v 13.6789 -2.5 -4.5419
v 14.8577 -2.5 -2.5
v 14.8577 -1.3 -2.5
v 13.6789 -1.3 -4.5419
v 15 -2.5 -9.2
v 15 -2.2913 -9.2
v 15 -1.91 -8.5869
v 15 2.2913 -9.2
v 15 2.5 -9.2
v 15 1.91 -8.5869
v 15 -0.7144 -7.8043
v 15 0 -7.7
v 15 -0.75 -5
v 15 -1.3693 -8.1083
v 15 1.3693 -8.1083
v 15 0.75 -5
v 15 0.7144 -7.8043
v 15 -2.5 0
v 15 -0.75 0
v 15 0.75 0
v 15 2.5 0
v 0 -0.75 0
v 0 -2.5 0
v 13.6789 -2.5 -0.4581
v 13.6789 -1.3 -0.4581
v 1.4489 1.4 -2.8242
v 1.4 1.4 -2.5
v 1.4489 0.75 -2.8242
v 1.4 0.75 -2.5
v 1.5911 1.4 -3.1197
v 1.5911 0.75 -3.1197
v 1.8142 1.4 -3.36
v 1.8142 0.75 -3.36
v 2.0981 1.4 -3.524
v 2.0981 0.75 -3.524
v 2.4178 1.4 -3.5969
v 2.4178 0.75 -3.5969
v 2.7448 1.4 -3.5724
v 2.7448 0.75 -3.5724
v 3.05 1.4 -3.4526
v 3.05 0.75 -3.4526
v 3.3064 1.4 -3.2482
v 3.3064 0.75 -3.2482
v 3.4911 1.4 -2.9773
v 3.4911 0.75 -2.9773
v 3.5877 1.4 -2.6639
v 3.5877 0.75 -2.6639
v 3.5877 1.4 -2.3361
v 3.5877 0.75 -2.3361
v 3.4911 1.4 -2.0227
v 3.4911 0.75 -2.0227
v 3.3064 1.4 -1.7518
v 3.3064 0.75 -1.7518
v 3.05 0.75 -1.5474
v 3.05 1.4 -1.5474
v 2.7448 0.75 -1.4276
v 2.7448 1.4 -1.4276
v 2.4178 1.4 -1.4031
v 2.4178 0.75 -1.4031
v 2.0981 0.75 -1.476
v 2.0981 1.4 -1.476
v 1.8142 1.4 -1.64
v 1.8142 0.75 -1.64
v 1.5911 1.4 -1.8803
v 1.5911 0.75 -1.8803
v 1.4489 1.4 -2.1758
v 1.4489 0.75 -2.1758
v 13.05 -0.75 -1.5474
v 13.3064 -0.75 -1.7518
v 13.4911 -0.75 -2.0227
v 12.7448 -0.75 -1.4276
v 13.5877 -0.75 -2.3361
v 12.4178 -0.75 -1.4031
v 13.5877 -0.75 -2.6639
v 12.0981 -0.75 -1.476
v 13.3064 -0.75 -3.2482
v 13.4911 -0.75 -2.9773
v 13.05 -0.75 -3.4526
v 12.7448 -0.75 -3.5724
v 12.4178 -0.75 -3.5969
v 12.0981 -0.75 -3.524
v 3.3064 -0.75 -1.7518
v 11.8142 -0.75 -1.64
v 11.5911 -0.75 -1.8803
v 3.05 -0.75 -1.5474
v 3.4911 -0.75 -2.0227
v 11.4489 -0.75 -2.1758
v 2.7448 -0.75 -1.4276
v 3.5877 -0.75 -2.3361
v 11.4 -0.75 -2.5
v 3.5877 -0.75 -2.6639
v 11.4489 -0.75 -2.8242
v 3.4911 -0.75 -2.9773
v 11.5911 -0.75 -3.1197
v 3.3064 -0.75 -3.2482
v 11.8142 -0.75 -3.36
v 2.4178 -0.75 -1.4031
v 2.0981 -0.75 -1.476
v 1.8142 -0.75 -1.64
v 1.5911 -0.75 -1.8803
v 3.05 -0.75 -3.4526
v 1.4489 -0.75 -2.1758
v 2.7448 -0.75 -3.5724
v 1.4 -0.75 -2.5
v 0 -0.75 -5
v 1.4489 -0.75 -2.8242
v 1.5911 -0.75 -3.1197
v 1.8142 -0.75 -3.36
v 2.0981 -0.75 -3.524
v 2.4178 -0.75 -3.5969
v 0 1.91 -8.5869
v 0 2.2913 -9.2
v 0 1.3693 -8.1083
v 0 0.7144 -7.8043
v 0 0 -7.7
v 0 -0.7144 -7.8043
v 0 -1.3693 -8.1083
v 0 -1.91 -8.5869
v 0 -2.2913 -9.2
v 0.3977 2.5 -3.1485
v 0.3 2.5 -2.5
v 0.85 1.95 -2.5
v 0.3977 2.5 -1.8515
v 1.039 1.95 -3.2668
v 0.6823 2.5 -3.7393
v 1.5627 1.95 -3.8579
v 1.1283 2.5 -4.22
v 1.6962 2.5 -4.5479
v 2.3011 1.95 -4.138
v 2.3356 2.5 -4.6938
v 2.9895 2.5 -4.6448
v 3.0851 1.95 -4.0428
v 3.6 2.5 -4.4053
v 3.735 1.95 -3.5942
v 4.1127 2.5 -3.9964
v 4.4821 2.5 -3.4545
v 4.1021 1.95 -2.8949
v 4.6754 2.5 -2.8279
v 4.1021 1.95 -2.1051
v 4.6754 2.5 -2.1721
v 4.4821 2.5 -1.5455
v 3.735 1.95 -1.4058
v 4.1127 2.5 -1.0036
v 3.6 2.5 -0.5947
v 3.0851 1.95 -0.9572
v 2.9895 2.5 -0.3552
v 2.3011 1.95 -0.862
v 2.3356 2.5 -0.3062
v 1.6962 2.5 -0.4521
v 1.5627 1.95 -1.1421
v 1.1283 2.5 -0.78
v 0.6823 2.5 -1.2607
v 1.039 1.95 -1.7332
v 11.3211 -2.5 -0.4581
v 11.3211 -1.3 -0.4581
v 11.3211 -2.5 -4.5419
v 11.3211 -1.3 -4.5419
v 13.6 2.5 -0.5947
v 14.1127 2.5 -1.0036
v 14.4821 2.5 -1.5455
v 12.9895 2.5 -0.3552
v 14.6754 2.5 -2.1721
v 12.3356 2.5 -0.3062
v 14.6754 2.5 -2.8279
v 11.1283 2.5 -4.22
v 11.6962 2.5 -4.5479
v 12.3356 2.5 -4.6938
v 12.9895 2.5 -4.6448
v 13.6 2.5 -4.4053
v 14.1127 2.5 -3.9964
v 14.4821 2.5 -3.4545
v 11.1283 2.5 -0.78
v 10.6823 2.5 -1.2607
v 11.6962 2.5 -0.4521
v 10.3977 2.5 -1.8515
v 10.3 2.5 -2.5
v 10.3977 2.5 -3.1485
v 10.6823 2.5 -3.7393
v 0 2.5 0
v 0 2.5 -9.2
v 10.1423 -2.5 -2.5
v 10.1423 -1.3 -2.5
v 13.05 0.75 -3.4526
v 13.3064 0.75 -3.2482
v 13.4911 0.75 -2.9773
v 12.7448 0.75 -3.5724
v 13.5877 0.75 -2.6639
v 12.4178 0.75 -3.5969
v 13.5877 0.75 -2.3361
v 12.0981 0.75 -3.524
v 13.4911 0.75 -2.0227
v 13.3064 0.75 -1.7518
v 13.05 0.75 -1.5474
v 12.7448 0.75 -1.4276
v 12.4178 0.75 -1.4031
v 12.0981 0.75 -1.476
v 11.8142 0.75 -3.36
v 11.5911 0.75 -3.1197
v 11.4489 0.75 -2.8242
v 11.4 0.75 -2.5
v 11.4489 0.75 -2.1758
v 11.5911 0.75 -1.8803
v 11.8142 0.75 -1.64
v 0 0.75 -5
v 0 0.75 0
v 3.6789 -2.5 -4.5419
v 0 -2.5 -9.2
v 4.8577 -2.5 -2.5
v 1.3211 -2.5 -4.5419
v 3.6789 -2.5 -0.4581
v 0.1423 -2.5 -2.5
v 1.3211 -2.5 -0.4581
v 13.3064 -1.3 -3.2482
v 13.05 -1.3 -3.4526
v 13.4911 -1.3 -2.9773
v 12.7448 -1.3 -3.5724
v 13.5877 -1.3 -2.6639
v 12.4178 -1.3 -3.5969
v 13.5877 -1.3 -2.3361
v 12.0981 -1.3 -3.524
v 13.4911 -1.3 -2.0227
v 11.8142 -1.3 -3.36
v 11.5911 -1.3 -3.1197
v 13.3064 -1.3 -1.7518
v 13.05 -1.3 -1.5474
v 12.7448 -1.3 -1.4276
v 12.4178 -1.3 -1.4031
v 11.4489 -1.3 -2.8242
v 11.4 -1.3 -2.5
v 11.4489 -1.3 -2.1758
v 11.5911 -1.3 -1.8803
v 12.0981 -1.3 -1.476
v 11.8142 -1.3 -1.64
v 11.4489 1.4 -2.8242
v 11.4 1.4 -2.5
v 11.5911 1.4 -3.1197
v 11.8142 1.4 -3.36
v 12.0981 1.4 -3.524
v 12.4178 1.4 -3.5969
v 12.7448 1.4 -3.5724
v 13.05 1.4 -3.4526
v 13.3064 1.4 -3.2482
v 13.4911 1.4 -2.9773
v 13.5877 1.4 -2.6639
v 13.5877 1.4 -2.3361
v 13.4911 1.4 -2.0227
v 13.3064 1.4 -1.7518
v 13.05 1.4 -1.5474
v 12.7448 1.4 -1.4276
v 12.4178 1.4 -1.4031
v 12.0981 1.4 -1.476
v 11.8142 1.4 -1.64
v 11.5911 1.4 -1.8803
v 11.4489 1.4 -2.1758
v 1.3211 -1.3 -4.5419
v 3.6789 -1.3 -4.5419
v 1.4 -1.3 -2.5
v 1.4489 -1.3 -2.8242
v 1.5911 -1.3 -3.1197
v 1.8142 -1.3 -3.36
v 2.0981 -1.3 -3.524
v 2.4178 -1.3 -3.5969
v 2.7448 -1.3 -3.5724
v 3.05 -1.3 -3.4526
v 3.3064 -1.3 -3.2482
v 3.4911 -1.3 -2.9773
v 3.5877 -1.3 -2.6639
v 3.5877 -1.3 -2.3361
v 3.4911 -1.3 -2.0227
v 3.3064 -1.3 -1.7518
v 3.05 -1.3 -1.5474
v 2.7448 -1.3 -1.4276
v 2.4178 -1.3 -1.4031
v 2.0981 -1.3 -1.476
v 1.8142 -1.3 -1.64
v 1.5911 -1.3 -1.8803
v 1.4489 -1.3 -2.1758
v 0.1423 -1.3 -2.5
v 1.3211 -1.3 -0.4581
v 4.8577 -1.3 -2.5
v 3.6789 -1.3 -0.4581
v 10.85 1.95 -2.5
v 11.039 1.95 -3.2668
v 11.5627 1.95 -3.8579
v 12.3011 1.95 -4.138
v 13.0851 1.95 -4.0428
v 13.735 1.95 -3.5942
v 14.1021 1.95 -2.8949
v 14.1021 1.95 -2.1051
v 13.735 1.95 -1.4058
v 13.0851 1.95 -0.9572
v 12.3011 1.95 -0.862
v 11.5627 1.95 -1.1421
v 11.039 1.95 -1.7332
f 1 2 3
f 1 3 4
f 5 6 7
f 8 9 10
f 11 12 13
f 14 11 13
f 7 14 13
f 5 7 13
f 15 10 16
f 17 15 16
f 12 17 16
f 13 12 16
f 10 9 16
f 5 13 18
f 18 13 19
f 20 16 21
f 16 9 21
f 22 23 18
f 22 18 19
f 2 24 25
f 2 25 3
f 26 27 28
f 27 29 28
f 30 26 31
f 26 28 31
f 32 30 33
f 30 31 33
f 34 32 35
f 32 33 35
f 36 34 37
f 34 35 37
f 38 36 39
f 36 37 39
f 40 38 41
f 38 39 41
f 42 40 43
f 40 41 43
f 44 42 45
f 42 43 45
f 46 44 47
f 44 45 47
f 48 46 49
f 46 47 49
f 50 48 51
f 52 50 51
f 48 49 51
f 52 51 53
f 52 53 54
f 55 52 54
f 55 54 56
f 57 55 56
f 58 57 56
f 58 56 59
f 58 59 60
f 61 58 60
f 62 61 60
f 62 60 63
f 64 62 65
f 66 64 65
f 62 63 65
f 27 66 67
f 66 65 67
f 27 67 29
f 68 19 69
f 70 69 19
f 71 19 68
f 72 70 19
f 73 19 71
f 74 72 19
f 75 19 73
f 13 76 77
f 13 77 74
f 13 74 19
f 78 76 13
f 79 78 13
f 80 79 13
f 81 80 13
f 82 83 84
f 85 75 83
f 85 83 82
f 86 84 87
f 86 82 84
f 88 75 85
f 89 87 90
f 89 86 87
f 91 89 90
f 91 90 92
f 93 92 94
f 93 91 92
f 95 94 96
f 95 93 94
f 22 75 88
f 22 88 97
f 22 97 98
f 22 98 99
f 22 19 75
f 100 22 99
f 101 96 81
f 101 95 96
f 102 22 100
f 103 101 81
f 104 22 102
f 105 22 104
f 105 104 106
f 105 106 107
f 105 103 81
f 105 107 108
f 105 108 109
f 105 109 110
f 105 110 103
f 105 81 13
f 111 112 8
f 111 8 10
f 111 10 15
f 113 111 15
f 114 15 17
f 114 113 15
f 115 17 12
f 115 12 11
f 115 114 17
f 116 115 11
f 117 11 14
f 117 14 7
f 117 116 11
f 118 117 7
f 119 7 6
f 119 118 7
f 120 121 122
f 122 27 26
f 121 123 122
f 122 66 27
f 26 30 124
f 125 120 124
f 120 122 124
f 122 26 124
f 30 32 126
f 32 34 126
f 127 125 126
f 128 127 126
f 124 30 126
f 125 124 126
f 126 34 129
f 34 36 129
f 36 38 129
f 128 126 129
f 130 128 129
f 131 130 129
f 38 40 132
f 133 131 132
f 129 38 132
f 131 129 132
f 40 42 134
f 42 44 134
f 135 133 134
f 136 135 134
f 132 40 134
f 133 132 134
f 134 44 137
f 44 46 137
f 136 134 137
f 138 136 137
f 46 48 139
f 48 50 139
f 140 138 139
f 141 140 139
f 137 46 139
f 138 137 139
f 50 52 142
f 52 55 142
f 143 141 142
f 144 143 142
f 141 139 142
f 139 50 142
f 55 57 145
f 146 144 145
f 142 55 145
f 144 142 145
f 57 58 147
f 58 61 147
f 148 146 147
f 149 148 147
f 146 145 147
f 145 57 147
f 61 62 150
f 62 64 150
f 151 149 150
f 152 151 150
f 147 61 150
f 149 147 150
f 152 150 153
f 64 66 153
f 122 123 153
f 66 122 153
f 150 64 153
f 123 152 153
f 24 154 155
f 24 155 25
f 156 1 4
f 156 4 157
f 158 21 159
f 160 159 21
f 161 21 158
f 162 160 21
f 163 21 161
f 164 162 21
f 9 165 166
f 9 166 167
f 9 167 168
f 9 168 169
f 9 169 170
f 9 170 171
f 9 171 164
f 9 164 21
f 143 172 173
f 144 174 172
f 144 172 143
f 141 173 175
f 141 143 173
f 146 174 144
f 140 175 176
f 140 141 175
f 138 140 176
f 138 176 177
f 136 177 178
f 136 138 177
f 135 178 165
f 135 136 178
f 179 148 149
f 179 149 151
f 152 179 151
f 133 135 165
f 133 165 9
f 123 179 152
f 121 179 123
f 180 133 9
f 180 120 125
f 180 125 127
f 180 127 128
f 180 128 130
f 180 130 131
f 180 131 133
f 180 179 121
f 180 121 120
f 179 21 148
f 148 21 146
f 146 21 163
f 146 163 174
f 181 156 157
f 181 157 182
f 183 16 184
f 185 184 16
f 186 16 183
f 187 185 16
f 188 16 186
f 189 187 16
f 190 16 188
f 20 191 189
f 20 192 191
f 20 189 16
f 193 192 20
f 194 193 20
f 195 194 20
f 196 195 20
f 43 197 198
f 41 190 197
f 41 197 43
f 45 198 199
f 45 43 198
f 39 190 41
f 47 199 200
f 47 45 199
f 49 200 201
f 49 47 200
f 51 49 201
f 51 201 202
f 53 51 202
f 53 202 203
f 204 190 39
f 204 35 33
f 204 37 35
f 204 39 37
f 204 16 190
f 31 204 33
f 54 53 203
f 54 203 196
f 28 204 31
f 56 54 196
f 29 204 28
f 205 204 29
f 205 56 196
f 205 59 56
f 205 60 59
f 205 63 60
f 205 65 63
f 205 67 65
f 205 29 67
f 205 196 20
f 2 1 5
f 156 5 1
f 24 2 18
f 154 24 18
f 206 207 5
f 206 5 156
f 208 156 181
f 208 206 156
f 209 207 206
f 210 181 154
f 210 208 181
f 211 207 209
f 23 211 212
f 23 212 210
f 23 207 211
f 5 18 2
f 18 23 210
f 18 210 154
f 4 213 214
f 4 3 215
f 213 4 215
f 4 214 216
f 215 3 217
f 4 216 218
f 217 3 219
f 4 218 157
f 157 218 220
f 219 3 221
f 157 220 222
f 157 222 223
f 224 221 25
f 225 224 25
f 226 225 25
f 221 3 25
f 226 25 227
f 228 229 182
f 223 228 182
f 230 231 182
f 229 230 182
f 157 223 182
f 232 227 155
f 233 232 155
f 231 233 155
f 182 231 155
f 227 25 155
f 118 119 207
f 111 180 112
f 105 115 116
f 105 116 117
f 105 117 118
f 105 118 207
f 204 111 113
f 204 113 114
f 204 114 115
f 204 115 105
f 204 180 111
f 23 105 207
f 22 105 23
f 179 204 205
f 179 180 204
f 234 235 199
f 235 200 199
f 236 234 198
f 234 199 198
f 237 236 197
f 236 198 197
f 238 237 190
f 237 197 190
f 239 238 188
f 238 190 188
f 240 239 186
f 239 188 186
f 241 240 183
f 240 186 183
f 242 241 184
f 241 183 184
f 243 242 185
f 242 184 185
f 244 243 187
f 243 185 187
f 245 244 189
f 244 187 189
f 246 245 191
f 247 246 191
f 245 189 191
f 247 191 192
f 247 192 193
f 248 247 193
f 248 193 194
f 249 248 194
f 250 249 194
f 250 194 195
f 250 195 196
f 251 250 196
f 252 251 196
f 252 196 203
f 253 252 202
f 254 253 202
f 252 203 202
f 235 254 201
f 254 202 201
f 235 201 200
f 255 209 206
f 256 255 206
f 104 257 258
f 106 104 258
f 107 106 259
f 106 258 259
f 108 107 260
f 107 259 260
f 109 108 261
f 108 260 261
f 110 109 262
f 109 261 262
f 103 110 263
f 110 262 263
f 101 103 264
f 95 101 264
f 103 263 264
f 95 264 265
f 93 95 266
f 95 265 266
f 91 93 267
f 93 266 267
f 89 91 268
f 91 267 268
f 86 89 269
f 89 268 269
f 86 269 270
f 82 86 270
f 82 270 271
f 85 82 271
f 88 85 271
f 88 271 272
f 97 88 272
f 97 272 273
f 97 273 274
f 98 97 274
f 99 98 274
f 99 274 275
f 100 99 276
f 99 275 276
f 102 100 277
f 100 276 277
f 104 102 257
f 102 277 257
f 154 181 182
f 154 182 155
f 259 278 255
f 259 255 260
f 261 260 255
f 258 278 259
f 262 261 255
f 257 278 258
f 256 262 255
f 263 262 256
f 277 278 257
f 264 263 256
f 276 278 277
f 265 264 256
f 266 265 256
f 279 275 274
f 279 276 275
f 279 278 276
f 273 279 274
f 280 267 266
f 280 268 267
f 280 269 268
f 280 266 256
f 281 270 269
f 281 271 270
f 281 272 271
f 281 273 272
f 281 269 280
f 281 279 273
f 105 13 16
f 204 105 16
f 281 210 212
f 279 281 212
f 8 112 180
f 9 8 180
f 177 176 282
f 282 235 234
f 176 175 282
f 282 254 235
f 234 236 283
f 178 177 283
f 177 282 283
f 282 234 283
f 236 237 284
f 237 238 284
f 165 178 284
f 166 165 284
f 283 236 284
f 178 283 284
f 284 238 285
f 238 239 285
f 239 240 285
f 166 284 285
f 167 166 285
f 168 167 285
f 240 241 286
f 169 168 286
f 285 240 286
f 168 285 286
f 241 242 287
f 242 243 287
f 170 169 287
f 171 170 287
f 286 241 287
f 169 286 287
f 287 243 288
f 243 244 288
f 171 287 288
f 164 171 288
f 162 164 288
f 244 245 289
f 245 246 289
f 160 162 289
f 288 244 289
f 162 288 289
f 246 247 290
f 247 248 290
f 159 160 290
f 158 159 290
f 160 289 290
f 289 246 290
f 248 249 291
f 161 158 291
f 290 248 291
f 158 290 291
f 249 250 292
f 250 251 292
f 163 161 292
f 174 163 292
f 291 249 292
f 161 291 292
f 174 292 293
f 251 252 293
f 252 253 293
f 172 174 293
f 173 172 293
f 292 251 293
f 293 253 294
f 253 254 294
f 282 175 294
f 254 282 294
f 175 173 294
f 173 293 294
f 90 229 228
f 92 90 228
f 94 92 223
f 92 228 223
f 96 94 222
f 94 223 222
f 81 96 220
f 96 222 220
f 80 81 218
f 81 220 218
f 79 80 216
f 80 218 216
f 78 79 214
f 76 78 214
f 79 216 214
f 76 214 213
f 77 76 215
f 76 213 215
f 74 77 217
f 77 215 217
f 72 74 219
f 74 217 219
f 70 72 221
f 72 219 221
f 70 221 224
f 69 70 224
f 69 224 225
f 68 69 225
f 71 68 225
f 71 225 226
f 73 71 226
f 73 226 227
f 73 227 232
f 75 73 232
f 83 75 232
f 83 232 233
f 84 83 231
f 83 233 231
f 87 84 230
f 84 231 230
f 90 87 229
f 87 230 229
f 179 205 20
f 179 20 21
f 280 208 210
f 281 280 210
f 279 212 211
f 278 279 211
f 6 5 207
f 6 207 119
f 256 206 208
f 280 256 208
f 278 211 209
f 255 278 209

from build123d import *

# Parameters (mm, degrees)
EXTRUDE_1_DEPTH             = 15
SKETCH_2_W                  = 1
SKETCH_2_H                  = 1
CUT_EXTRUDE_1_DEPTH         = 15
HOLE_WIZARD_M21_D           = 2.2
HOLE_WIZARD_M21_CSINK_D     = 4.4
HOLE_WIZARD_M21_CSINK_ANGLE = 90
CUT_EXTRUDE_2_DEPTH         = 1.2


with BuildPart() as part:
    # Эскиз1 → Бобышка-Вытянуть1 (new body)
    with BuildSketch(Plane(origin=(0, 0, 0), x_dir=(0, 0, -1), z_dir=(1, 0, 0))):
        with BuildLine():
            ThreePointArc((10.2, 2.5), (7.7, 0), (10.2, -2.5))
            Line((10.2, -2.5), (0, -2.5))
            Line((0, -2.5), (0, -0.75))
            Line((0, -0.75), (5, -0.75))
            Line((5, -0.75), (5, 0.75))
            Line((5, 0.75), (0, 0.75))
            Line((0, 0.75), (0, 2.5))
            Line((0, 2.5), (10.2, 2.5))
        make_face()
    extrude(amount=EXTRUDE_1_DEPTH)

    # Эскиз2 → Вырез-Вытянуть1 (cut)
    with BuildSketch(Plane(origin=(15, 0, 0), x_dir=(0, 0, -1), z_dir=(1, 0, 0))):
        with Locations((9.7, 2)):
            Rectangle(SKETCH_2_W, SKETCH_2_H)
        with Locations((9.7, -2)):
            Rectangle(SKETCH_2_W, SKETCH_2_H)
    extrude(amount=-CUT_EXTRUDE_1_DEPTH, mode=Mode.SUBTRACT)

    # Зенковка для винта с полупотайной головкой M21 (through all)
    with Locations(Plane(origin=(0, 2.5, 0), x_dir=(1, 0, 0), z_dir=(0, 1, 0))):
        with Locations((12.5, 2.5), (2.5, 2.5)):
            CounterSinkHole(HOLE_WIZARD_M21_D / 2, HOLE_WIZARD_M21_CSINK_D / 2, counter_sink_angle=HOLE_WIZARD_M21_CSINK_ANGLE)

    # Эскиз5 → Вырез-Вытянуть2 (cut)
    with BuildSketch(Plane.XZ.offset(2.5)):
        Polygon((1.321132129, -0.458141777), (0.142264973, -2.500000412), (1.321132843, -4.541858635), (3.678867871, -4.541858223), (4.857735027, -2.499999588), (3.678867157, -0.458141365), align=None)
        Polygon((13.678867157, -4.541858635), (11.321132129, -4.541858223), (10.142264973, -2.499999588), (11.321132843, -0.458141365), (13.678867871, -0.458141777), (14.857735027, -2.500000412), align=None)
    extrude(amount=-CUT_EXTRUDE_2_DEPTH, mode=Mode.SUBTRACT)


solid = part.part
